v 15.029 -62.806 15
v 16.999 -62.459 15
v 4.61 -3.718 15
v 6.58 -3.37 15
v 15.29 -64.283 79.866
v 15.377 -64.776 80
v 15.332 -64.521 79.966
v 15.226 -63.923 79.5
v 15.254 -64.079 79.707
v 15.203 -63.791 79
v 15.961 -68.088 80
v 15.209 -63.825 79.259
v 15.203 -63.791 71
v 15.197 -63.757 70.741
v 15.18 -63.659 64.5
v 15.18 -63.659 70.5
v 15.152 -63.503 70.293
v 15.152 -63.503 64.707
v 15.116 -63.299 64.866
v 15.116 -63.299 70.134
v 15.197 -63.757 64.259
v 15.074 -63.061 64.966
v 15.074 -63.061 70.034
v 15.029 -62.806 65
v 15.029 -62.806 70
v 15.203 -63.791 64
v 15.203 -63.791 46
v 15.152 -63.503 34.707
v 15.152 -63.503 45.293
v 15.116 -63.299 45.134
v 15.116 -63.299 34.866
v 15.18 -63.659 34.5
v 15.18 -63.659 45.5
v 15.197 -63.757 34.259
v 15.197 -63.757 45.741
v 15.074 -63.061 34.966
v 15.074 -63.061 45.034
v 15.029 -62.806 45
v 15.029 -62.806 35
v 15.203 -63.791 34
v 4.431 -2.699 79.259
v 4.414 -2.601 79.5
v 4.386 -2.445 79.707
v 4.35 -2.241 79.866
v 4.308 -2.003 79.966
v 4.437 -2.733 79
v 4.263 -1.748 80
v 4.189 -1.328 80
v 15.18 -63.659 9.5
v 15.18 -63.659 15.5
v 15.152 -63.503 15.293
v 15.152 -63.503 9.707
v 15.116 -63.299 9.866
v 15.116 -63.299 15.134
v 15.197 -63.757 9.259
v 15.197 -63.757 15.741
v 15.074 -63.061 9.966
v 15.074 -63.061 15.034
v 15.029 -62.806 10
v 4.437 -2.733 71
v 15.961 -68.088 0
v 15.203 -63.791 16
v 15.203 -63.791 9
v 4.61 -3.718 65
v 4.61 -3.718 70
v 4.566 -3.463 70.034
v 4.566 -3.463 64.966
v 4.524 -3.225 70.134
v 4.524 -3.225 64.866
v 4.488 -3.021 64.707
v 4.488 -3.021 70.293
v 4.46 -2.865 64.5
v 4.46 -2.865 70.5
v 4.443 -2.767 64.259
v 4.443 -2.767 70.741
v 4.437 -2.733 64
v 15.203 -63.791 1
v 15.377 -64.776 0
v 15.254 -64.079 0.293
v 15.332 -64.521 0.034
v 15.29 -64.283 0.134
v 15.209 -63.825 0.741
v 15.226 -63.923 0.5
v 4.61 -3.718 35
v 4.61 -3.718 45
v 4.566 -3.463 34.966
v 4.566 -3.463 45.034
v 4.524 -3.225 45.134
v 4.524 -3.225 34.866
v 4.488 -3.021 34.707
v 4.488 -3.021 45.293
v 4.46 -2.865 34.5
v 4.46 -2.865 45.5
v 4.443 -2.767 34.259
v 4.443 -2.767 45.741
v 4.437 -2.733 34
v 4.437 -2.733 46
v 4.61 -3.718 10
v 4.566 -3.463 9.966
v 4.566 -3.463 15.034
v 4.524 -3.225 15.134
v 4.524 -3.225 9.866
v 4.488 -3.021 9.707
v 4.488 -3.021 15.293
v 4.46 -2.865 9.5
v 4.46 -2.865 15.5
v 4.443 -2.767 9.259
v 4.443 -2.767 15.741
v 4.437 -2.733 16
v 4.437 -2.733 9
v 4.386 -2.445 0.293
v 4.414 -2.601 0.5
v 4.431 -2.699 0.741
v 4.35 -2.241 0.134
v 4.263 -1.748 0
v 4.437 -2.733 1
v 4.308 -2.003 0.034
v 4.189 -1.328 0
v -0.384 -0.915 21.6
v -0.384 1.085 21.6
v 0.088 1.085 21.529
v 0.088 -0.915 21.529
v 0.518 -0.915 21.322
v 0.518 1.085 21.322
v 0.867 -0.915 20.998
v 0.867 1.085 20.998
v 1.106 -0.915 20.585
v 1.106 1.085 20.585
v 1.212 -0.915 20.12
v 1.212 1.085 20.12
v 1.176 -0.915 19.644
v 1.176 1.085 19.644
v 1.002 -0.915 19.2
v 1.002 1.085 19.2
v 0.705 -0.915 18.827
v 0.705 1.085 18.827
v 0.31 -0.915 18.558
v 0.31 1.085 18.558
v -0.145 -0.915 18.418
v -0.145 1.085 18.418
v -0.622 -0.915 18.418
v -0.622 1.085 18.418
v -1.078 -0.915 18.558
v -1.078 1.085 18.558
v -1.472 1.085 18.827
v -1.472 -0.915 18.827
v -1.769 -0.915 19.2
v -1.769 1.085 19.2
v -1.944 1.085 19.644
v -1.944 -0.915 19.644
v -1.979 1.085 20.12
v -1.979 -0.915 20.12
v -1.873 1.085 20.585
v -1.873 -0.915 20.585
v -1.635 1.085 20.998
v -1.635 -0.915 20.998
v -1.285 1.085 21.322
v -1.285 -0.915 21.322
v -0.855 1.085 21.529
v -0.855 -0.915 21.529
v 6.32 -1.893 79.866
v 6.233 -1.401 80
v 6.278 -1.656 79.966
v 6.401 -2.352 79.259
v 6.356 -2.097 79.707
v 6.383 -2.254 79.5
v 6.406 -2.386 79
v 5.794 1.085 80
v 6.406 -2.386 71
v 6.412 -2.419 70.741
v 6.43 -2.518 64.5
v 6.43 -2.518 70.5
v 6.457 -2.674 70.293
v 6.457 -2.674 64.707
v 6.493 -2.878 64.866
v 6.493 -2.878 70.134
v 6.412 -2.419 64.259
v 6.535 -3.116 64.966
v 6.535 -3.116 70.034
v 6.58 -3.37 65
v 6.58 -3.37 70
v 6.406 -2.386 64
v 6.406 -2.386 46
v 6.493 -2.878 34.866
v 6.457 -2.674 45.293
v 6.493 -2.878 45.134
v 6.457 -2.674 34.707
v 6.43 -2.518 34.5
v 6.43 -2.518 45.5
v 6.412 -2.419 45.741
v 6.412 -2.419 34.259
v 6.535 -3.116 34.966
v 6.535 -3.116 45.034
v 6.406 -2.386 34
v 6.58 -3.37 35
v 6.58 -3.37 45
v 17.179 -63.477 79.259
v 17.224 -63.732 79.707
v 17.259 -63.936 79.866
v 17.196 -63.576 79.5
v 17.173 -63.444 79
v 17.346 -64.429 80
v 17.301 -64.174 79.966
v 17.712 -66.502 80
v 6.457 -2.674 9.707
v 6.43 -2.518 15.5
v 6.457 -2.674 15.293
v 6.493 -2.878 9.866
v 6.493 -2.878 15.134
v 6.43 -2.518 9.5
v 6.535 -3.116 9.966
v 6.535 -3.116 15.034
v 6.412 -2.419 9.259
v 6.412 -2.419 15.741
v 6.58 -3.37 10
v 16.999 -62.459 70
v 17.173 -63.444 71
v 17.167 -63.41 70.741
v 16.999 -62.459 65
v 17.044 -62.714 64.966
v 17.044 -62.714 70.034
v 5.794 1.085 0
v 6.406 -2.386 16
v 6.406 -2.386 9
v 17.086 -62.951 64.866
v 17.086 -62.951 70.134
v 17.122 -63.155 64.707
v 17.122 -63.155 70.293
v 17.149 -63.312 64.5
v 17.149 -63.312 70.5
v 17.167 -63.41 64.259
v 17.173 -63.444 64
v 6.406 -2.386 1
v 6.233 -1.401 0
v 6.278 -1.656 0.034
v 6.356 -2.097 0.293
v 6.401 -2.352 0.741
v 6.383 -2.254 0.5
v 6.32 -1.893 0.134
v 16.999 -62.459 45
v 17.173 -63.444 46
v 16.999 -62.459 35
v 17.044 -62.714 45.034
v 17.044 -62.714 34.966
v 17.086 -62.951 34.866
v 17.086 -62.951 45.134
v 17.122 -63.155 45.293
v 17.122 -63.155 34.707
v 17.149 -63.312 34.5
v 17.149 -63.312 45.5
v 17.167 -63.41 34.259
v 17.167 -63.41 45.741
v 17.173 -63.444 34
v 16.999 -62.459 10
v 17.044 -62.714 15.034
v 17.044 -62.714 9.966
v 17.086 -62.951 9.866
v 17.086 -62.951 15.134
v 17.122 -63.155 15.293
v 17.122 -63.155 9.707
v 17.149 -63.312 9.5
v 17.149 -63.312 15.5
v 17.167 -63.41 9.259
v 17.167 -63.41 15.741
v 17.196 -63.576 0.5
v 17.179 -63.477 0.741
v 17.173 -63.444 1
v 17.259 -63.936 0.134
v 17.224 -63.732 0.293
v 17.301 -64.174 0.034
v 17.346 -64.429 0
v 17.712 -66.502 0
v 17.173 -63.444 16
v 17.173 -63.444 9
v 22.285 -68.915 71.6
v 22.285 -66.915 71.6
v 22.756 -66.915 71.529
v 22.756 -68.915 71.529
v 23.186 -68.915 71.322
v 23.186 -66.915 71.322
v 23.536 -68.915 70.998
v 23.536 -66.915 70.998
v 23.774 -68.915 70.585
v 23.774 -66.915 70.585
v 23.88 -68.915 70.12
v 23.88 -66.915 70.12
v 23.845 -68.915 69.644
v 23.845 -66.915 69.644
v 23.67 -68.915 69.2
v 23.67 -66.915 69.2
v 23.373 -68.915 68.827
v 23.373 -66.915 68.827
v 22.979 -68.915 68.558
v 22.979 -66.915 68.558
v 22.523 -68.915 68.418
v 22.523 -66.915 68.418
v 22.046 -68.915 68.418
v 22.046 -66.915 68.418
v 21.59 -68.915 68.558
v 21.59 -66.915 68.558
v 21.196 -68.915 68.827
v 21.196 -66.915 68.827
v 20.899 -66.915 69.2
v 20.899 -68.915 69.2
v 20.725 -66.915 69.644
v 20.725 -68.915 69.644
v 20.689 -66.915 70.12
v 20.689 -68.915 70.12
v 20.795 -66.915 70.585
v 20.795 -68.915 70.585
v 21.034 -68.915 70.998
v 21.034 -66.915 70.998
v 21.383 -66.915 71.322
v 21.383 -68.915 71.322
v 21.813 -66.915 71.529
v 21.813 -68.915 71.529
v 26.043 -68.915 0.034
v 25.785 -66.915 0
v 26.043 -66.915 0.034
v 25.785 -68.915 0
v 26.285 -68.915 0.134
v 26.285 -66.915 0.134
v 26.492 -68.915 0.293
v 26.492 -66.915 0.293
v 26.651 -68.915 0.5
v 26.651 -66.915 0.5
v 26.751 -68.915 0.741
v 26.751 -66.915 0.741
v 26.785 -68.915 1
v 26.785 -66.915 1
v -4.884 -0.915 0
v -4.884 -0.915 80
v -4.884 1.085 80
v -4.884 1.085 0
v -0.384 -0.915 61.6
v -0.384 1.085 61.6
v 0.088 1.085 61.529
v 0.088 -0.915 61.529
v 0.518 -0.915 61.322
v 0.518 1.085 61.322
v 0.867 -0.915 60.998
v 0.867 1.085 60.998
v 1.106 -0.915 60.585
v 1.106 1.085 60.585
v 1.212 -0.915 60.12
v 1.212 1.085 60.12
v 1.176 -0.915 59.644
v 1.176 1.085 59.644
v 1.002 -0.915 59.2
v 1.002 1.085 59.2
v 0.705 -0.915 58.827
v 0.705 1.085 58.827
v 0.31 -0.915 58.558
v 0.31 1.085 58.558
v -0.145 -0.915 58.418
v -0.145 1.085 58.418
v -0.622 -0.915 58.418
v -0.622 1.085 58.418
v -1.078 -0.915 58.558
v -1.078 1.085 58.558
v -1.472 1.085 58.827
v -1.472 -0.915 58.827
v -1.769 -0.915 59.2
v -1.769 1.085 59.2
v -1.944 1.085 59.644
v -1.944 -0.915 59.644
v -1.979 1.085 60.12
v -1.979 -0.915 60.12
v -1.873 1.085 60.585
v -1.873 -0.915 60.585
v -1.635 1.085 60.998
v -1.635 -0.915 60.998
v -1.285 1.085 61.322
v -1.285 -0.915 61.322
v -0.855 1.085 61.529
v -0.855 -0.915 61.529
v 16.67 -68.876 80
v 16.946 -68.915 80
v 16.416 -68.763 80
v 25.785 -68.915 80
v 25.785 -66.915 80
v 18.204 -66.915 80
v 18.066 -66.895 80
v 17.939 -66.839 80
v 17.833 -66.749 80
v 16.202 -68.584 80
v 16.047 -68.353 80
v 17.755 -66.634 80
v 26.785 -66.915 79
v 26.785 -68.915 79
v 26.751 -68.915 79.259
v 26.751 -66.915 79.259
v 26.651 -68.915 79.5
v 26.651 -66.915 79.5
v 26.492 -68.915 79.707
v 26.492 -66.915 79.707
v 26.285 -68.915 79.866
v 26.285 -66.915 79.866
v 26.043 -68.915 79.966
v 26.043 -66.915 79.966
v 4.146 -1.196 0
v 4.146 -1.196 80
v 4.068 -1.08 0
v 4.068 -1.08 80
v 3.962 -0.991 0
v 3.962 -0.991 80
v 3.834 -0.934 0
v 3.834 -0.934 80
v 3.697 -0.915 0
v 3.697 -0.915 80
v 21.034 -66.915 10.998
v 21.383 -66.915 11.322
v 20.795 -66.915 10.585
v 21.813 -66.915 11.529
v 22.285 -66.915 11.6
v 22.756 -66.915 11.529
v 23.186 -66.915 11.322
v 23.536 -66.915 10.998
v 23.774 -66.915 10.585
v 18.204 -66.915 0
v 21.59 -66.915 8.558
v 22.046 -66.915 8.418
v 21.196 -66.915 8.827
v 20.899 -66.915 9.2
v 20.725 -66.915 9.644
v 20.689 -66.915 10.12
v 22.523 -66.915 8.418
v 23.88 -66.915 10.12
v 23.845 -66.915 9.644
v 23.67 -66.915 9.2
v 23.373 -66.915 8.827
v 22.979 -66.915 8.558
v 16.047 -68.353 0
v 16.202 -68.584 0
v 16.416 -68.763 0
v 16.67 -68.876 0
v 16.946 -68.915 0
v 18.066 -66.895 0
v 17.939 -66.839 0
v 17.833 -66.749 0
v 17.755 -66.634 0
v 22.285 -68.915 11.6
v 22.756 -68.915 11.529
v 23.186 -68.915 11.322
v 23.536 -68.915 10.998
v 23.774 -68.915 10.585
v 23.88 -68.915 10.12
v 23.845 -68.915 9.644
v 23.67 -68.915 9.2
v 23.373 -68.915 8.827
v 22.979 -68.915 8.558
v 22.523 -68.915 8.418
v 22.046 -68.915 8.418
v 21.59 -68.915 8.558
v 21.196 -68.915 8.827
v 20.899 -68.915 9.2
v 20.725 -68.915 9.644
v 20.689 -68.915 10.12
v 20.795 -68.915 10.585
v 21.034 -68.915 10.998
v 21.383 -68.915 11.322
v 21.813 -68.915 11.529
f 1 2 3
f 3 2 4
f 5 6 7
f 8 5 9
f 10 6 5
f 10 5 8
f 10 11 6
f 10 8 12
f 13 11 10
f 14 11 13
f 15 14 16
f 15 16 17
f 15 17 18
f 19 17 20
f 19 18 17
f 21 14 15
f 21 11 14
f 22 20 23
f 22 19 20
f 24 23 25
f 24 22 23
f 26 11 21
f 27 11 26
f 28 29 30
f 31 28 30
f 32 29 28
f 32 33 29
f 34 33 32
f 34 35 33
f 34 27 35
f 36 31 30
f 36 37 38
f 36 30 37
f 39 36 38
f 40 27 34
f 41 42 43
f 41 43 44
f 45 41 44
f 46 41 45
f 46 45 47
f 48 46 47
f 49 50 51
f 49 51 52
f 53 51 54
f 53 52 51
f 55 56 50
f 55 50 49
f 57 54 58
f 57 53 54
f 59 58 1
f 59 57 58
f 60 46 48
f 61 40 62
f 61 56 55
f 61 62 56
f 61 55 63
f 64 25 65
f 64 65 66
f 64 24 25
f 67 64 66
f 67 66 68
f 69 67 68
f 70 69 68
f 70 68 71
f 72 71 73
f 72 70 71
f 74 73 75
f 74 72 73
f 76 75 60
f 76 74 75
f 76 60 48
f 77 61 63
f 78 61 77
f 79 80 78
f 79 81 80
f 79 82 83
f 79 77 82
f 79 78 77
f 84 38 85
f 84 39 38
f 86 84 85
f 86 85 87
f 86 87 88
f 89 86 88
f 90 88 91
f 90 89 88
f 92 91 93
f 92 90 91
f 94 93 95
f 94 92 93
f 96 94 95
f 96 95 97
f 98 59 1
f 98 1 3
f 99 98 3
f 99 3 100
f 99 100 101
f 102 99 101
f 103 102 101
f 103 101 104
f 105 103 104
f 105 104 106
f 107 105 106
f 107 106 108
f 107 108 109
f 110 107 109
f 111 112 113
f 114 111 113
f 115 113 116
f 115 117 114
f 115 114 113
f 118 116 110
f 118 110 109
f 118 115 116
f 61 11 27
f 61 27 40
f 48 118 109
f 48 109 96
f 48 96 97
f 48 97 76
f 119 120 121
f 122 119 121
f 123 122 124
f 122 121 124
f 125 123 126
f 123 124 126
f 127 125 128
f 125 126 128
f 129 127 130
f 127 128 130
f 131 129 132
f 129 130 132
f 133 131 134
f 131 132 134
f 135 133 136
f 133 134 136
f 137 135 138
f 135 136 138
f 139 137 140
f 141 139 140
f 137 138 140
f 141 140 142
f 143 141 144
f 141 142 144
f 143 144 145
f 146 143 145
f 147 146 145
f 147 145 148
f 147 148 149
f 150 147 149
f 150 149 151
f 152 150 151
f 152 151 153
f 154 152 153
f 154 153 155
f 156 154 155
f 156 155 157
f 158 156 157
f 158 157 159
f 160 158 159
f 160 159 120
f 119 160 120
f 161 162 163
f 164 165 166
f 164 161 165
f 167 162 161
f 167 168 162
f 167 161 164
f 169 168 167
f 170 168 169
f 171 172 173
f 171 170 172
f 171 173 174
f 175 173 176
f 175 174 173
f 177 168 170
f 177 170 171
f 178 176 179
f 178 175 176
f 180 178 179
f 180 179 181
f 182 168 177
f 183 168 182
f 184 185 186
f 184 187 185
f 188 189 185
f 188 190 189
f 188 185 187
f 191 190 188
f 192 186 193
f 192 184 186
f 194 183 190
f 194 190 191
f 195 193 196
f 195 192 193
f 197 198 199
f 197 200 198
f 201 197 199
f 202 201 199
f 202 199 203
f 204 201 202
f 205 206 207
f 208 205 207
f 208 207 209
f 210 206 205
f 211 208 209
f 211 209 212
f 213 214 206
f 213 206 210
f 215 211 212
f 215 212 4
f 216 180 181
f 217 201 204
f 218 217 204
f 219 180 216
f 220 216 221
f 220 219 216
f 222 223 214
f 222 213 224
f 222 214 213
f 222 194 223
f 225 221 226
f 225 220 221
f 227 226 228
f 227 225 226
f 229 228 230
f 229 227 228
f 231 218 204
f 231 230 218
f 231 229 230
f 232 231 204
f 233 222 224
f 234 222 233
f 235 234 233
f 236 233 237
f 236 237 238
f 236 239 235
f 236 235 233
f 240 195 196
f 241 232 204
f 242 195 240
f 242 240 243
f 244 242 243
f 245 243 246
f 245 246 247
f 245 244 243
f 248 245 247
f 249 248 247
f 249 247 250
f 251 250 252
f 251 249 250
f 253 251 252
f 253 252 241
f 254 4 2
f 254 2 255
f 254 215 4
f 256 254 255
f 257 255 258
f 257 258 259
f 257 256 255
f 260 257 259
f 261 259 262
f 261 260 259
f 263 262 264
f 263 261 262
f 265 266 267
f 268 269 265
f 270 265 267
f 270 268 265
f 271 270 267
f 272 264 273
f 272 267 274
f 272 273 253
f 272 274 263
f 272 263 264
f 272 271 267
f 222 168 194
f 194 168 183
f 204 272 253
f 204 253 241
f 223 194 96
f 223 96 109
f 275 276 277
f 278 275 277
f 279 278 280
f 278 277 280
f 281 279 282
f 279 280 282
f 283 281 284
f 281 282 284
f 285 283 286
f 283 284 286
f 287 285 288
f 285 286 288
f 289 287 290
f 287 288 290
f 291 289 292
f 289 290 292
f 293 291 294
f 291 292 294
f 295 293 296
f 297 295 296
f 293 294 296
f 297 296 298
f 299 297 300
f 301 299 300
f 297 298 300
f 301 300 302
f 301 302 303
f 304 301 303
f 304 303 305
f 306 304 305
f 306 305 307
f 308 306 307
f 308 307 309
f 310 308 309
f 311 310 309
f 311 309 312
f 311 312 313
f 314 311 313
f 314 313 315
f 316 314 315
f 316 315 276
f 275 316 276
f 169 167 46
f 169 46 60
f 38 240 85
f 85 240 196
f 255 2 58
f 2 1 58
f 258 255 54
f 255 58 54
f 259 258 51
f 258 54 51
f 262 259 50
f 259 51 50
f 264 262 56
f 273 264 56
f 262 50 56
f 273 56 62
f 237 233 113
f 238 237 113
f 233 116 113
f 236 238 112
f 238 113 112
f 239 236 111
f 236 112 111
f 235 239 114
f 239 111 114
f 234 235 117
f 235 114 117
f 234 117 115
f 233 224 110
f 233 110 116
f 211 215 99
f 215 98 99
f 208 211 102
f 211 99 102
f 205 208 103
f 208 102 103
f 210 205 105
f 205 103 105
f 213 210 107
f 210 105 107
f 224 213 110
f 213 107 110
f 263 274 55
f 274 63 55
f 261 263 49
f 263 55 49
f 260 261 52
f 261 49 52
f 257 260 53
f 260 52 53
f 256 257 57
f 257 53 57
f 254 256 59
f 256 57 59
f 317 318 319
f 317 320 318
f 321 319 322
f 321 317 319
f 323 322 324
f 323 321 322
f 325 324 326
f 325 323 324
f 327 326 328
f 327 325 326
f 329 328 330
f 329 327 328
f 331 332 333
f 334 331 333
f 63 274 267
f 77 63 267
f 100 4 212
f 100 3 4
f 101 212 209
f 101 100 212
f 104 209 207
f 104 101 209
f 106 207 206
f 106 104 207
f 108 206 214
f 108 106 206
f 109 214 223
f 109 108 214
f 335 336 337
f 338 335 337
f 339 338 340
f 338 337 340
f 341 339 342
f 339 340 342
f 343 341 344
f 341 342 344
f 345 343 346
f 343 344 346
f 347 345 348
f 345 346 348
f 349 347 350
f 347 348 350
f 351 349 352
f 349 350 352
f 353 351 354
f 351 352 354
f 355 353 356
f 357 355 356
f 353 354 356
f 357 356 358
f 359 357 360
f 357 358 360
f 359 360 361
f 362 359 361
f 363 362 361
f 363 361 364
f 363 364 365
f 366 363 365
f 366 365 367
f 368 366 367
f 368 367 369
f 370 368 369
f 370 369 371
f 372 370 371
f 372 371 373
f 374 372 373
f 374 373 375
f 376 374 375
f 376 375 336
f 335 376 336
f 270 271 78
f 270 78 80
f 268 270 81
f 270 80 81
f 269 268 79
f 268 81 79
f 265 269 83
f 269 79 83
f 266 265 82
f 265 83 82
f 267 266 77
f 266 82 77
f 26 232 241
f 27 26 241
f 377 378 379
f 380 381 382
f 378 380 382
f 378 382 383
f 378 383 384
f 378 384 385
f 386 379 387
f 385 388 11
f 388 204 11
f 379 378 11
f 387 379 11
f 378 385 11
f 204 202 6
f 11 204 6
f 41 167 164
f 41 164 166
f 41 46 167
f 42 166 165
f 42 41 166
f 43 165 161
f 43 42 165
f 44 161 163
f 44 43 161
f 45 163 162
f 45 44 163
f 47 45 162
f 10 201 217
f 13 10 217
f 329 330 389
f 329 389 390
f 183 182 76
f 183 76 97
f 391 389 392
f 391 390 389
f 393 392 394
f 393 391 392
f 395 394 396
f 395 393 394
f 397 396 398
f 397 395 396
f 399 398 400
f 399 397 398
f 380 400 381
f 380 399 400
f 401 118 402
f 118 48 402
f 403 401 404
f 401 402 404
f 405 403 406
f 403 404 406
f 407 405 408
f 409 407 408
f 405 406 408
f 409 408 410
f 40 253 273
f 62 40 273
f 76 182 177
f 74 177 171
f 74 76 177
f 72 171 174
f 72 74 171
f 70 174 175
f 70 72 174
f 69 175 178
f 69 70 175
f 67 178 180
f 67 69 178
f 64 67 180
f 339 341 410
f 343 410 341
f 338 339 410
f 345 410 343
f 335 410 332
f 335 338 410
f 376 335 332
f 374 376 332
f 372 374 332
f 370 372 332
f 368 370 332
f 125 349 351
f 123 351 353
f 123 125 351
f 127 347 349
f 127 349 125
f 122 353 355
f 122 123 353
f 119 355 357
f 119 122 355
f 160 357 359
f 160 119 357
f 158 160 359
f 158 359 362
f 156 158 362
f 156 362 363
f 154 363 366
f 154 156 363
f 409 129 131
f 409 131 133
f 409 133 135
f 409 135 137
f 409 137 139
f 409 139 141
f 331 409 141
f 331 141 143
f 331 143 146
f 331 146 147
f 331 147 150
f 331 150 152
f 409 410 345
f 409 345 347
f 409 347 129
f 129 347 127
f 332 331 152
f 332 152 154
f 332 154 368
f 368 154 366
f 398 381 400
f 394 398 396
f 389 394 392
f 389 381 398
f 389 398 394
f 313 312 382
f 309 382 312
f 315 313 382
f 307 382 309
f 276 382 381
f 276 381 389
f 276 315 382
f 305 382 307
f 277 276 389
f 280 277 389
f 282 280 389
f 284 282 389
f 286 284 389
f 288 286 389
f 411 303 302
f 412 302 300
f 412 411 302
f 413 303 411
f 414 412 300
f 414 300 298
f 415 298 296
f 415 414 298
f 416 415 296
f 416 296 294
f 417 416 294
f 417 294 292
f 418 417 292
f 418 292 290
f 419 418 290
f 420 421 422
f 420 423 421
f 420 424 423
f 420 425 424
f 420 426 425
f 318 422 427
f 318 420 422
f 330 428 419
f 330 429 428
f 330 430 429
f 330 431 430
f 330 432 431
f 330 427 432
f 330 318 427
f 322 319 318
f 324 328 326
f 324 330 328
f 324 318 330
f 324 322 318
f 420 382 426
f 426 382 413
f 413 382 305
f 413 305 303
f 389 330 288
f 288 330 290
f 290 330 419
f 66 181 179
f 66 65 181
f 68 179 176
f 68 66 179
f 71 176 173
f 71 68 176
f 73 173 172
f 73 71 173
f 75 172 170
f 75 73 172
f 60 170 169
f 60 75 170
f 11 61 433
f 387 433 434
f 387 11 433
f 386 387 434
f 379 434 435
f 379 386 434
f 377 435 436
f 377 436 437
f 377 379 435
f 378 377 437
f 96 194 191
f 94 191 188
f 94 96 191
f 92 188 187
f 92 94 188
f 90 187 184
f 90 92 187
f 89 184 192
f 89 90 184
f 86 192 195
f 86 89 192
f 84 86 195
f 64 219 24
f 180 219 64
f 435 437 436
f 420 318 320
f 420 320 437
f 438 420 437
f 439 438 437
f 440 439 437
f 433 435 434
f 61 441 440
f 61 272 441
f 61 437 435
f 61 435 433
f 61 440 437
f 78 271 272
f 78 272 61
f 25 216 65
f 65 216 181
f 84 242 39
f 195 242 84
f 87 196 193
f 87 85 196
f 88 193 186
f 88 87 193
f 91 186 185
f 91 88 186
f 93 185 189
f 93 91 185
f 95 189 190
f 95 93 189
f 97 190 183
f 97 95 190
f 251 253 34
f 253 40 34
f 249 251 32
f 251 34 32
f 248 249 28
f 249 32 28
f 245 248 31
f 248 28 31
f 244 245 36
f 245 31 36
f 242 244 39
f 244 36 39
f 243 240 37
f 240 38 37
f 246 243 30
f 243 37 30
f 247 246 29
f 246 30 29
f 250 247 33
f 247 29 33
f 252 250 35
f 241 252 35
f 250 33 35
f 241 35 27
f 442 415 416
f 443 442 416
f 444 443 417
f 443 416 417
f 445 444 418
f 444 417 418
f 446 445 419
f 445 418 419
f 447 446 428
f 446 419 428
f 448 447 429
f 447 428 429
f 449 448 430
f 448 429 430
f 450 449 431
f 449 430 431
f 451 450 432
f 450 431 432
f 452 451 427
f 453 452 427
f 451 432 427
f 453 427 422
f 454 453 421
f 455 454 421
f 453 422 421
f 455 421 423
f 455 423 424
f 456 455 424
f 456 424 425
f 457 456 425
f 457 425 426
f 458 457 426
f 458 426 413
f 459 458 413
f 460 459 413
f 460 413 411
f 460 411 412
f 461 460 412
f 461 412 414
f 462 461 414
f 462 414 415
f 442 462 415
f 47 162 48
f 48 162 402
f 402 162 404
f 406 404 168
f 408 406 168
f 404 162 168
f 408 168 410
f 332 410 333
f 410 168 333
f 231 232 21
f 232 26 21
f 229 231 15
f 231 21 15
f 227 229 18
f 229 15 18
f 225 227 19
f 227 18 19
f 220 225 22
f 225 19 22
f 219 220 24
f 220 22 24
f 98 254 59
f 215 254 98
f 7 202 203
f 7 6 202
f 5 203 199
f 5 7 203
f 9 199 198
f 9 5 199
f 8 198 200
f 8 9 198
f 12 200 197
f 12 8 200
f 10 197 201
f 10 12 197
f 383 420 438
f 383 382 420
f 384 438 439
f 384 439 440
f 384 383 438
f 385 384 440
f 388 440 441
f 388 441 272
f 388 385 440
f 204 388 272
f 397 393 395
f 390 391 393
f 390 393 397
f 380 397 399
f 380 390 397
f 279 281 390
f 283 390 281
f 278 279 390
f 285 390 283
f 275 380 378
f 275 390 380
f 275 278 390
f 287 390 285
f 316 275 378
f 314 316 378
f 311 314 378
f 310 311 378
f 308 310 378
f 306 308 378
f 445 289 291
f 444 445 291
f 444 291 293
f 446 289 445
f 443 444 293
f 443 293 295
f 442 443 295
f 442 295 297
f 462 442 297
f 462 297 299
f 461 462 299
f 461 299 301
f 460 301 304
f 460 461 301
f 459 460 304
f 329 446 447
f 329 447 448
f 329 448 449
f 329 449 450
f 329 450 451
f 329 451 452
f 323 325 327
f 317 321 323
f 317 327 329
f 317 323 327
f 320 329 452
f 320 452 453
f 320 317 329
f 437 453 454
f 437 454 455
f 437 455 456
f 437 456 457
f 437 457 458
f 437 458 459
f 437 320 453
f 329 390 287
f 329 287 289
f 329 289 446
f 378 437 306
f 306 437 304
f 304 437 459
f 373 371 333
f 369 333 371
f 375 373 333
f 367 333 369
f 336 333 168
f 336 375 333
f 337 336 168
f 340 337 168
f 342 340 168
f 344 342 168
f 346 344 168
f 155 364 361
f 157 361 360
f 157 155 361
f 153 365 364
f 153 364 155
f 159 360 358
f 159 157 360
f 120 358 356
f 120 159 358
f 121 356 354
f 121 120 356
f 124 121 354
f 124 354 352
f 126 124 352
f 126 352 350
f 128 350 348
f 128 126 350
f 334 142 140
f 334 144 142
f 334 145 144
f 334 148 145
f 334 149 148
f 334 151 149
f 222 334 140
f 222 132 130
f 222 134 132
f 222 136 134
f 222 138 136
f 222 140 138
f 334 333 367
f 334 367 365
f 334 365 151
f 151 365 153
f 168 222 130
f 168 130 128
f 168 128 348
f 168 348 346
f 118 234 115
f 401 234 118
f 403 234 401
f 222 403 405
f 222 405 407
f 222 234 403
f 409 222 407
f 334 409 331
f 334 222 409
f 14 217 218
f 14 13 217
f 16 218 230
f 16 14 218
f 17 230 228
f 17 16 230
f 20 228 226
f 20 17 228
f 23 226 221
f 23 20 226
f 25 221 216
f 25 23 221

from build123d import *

# Parameters (mm, degrees)
EXTRUDE_1_DEPTH     = 80
SKETCH_2_R          = 1.6
CUT_EXTRUDE_1_DEPTH = 50
SKETCH_5_R          = 1.6
CUT_EXTRUDE_2_DEPTH = 50
SKETCH_9_W          = 10
SKETCH_9_H          = 62
SKETCH_9_W_2        = 20
CUT_EXTRUDE_6_DEPTH = 50
FILLET_1_R          = 1
FILLET_2_R          = 1
FILLET_3_R          = 1
FILLET_4_R          = 0.5
FILLET_5_R          = 0.5


with BuildPart() as part:
    # 草图1 → 凸台-拉伸1 (new body)
    with BuildSketch(Plane.XY):
        Polygon((5.79442956, 1.085282156), (17.784664248, -66.914717844), (26.784664248, -66.914717844), (26.784664248, -68.914717844), (16.106464985, -68.914717844), (4.116230297, -0.914717844), (-4.883769703, -0.914717844), (-4.883769703, 1.085282156), align=None)
    extrude(amount=EXTRUDE_1_DEPTH)

    # 草图2 → 切除-拉伸1 (cut)
    with BuildSketch(Plane(origin=(0, 1.085282156, 0), x_dir=(1, 0, 0), z_dir=(0, 1, 0))):
        with Locations(Location((-0.383769703, -20, 0), (0, 0, 270))):
            Circle(SKETCH_2_R)
        with Locations(Location((-0.383769703, -60, 0), (0, 0, 270))):
            Circle(SKETCH_2_R)
    extrude(amount=-CUT_EXTRUDE_1_DEPTH, mode=Mode.SUBTRACT)

    # 草图5 → 切除-拉伸2 (cut)
    with BuildSketch(Plane(origin=(0, -66.914717844, 0), x_dir=(1, 0, 0), z_dir=(0, 1, 0))):
        with Locations(Location((22.284664248, -10, 0), (0, 0, 270))):
            Circle(SKETCH_5_R)
        with Locations(Location((22.284664248, -70, 0), (0, 0, 270))):
            Circle(SKETCH_5_R)
    extrude(amount=-CUT_EXTRUDE_2_DEPTH, mode=Mode.SUBTRACT)

    # 草图9 → 切除-拉伸6 (cut)
    with BuildSketch(Plane(origin=(5.805300309, 1.023631076, 0), x_dir=(0, 0, -1), z_dir=(0.9848077530122086, 0.17364817766692736, 0))):
        with Locations((-75, -34.461902656)):
            Rectangle(SKETCH_9_W, SKETCH_9_H)
        with Locations((-55, -34.461902656)):
            Rectangle(SKETCH_9_W_2, SKETCH_9_H)
        with Locations((-25, -34.461902656)):
            Rectangle(SKETCH_9_W_2, SKETCH_9_H)
        with Locations((-5, -34.461902656)):
            Rectangle(SKETCH_9_W, SKETCH_9_H)
    extrude(amount=-CUT_EXTRUDE_6_DEPTH, mode=Mode.SUBTRACT)

    # 圆角1
    fillet_1_edges = [part.edges().sort_by_distance(p)[0] for p in [
        (16.106464985, -68.914717844, 40),
    ]]
    fillet(fillet_1_edges, radius=FILLET_1_R)

    # 圆角2
    fillet_2_edges = [part.edges().sort_by_distance(p)[0] for p in [
        (16.187832658, -63.617406365, 0),
        (5.421645643, -2.559325678, 0),
        (16.187832658, -63.617406365, 80),
        (5.421645643, -2.559325678, 80),
        (16.187832658, -63.617406365, 70),
        (16.187832658, -63.617406365, 65),
        (16.187832658, -63.617406365, 45),
        (16.187832658, -63.617406365, 35),
        (16.187832658, -63.617406365, 15),
        (16.187832658, -63.617406365, 10),
    ]]
    fillet(fillet_2_edges, radius=FILLET_2_R)

    # 圆角3
    fillet_3_edges = [part.edges().sort_by_distance(p)[0] for p in [
        (26.784664248, -67.914717844, 0),
        (26.784664248, -67.914717844, 80),
        (5.421645643, -2.559325678, 70),
        (5.421645643, -2.559325678, 65),
        (5.421645643, -2.559325678, 45),
        (5.421645643, -2.559325678, 35),
        (5.421645643, -2.559325678, 15),
        (5.421645643, -2.559325678, 10),
    ]]
    fillet(fillet_3_edges, radius=FILLET_3_R)

    # 圆角4
    fillet_4_edges = [part.edges().sort_by_distance(p)[0] for p in [
        (17.784664248, -66.914717844, 40),
    ]]
    fillet(fillet_4_edges, radius=FILLET_4_R)

    # 圆角5
    fillet_5_edges = [part.edges().sort_by_distance(p)[0] for p in [
        (4.116230297, -0.914717844, 40),
    ]]
    fillet(fillet_5_edges, radius=FILLET_5_R)


solid = part.part
